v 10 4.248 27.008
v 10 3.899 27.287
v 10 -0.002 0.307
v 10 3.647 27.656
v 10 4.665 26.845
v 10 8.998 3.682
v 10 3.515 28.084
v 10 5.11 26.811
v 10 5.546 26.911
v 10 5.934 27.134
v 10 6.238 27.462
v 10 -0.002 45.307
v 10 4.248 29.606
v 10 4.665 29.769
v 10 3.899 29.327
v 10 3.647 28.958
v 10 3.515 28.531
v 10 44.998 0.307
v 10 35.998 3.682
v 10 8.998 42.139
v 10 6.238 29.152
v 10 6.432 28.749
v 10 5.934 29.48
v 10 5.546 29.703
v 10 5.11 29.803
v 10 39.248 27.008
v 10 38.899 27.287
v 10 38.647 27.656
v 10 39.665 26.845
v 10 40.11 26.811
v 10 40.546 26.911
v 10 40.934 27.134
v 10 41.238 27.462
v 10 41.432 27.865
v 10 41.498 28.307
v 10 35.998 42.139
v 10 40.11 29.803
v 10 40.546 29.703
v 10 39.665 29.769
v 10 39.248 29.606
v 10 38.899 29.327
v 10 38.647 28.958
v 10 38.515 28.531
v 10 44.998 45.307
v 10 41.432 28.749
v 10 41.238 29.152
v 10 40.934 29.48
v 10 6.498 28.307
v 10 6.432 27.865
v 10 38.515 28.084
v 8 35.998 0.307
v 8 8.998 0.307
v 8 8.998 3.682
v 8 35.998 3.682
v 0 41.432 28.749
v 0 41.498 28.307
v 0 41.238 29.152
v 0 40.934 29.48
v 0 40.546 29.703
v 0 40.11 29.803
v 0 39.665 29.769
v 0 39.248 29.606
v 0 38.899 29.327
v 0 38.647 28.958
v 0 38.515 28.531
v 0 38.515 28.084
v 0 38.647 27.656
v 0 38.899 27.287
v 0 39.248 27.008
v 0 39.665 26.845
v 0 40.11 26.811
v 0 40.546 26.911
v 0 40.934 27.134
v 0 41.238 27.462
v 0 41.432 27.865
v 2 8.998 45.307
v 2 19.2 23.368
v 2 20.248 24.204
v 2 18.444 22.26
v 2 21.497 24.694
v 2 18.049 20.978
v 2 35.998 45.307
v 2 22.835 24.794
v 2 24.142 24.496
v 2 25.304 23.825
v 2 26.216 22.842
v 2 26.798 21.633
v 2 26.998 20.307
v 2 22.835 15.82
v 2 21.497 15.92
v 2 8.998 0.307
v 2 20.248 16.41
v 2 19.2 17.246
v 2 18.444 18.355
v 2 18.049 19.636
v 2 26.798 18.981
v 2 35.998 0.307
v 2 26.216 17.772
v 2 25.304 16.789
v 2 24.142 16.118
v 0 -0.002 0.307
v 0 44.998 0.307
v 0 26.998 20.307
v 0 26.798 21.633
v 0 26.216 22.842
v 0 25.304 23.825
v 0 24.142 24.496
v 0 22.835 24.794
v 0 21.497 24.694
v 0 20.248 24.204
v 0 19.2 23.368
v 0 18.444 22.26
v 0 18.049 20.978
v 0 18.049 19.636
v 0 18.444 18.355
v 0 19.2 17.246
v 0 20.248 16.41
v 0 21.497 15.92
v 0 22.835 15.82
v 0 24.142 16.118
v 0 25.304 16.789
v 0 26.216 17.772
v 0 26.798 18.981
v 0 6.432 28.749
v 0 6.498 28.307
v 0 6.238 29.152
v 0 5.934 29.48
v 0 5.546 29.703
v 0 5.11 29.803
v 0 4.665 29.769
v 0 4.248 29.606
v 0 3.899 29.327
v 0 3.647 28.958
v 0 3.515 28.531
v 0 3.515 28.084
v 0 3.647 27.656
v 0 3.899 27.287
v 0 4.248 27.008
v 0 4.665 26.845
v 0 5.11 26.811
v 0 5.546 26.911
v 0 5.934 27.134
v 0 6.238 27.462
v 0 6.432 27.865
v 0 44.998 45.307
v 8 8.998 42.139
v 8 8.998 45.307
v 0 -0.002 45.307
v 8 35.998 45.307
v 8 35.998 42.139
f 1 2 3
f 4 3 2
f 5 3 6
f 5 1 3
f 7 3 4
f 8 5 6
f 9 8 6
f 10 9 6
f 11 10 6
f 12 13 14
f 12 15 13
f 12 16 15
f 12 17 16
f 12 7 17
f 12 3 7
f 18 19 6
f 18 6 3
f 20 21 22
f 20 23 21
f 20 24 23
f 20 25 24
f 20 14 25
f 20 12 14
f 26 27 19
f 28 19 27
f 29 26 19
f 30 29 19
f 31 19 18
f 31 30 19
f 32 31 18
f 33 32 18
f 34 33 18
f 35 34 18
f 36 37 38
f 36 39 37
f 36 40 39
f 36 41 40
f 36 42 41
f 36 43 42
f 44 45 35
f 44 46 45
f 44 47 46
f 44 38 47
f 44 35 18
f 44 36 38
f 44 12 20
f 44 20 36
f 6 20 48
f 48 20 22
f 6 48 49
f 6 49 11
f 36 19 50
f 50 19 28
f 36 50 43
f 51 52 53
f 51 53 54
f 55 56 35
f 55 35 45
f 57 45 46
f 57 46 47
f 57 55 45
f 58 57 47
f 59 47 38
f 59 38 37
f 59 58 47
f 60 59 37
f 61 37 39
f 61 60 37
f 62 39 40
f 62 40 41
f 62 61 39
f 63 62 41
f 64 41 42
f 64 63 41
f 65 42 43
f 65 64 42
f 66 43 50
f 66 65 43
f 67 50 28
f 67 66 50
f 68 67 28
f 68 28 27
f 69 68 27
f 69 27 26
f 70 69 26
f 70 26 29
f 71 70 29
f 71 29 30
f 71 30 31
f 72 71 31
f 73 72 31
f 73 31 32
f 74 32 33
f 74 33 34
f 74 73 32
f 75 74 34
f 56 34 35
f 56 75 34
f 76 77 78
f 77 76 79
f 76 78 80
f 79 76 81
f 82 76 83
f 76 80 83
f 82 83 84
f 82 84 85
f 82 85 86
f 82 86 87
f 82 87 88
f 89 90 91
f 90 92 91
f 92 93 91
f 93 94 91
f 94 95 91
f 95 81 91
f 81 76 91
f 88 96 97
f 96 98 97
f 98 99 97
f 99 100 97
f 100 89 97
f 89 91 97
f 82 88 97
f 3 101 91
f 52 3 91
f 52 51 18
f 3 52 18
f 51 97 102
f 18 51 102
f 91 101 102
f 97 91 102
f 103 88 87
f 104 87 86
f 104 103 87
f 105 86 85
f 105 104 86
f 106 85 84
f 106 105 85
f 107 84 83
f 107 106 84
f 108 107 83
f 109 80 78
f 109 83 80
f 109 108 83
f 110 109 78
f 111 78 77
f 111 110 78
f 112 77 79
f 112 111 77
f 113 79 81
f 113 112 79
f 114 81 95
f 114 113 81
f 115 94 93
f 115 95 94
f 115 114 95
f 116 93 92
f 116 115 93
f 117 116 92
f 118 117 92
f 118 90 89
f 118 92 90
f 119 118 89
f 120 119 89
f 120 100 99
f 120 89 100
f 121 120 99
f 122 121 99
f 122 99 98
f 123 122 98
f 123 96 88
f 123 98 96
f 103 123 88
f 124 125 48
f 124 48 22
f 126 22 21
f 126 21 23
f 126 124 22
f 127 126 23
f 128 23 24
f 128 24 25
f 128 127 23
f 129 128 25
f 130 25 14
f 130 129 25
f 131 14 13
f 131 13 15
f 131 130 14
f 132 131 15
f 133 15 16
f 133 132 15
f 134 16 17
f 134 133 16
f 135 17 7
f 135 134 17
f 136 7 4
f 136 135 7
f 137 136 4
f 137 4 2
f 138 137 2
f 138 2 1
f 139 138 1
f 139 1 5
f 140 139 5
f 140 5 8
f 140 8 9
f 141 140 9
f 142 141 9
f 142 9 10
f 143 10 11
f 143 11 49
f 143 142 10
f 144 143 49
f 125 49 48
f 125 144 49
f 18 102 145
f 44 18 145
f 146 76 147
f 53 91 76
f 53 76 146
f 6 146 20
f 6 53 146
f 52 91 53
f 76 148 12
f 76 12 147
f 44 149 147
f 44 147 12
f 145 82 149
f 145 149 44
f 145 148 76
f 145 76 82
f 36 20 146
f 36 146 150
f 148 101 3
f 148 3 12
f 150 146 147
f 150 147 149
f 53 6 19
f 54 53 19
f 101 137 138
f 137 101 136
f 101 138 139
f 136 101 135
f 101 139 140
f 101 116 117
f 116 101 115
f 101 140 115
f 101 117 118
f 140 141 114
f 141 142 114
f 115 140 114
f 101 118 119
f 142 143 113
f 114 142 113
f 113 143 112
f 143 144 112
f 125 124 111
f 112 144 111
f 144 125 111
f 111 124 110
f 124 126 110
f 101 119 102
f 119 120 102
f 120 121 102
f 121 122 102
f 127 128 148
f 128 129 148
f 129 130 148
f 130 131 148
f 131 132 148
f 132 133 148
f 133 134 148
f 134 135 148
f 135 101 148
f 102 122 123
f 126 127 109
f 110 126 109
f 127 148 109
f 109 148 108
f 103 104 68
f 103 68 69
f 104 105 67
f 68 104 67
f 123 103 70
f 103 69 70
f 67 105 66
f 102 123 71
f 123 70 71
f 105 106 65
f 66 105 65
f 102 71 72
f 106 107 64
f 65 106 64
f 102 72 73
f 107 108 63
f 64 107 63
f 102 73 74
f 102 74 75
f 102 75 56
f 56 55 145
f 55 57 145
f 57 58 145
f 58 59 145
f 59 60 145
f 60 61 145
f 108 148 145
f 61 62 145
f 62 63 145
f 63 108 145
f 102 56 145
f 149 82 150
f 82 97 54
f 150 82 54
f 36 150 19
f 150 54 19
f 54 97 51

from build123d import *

# Parameters (mm, degrees)
F0_W     = 45
F0_H     = 45
F1_DEPTH = 10
F2_W     = 6
F2_H     = 27
F3_DEPTH = 4510
F4_R     = 4.5
F4_R_2   = 1.5
F5_DEPTH = 10
F6_W     = 27
F6_H     = 38.457482
F7_DEPTH = 5


with BuildPart() as f1:
    # F0 (on Right) → F1 (new body)
    with BuildSketch(Plane.YZ):
        with Locations((22.498396, 22.80707)):
            Rectangle(F0_W, F0_H)
    extrude(amount=F1_DEPTH)

    # F2 (on Top) → F3 (cut)
    with BuildSketch(Plane.XY):
        with Locations((5, 22.498396)):
            Rectangle(F2_W, F2_H)
    extrude(amount=F3_DEPTH, mode=Mode.SUBTRACT)

    # F4 (on Right) → F5 (cut)
    with BuildSketch(Plane.YZ):
        with Locations((22.498396, 20.30707)):
            Circle(F4_R)
        with Locations((4.998396, 28.30707)):
            Circle(F4_R_2)
        with Locations((39.998396, 28.30707)):
            Circle(F4_R_2)
    extrude(amount=F5_DEPTH, mode=Mode.SUBTRACT)

    # F6 (on face) → F7 (cut)
    with BuildSketch(Plane.YZ.offset(10)):
        with Locations((22.498396, 22.910485)):
            Rectangle(F6_W, F6_H)
    extrude(amount=-F7_DEPTH, mode=Mode.SUBTRACT)


solid = f1.part
